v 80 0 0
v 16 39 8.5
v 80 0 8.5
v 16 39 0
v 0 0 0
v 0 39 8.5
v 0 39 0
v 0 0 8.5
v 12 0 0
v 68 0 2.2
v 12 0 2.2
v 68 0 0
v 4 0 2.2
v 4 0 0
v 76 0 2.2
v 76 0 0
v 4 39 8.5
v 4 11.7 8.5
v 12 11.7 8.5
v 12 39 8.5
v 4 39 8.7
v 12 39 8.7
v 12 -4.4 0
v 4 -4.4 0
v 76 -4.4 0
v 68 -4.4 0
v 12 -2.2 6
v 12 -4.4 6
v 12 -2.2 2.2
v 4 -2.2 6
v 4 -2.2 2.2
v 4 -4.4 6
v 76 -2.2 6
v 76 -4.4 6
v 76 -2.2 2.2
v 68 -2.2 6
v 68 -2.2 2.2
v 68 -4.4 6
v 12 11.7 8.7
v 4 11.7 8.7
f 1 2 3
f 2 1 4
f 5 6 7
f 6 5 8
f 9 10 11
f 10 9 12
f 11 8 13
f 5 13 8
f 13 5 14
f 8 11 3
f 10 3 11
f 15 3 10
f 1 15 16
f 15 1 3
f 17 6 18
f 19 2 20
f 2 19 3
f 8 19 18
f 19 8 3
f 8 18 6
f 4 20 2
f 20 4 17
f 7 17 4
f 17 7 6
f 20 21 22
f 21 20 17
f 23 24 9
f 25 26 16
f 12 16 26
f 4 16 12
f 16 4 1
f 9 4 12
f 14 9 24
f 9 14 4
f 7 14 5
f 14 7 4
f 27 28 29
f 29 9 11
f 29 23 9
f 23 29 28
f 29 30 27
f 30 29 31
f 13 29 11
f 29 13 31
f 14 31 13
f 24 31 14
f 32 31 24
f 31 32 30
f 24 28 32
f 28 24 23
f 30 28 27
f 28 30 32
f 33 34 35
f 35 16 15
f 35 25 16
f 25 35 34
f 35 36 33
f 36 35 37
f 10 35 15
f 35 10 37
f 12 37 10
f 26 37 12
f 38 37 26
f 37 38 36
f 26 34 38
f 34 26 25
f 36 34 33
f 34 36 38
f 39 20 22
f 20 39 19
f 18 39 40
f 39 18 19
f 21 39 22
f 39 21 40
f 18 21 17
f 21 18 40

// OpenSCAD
// kerb

kerb_length = 80; // mm
kerb_width = 39; // mm
kerb_height = 8.5; // mm
kerb_angle = 0.2; // %

linear_extrude(kerb_height) polygon([
    [0, 0], 
    [kerb_length, 0], 
    [kerb_length * kerb_angle, kerb_width], 
    [0, kerb_width]
]);

// hooks

hook_width = 8; // mm
hook_bend_height = 2.2; // mm
hook_bend_length = 2.2; // mm
hook_barb_height = 6; // mm
hook_barb_length = 1; // mm

linear_extrude(hook_bend_height) polygon([
    [0.05*kerb_length, 0], 
    [0.05*kerb_length + hook_width, 0], 
    [0.05*kerb_length + hook_width, -hook_bend_length], 
    [0.05*kerb_length, -hook_bend_length]
]);


linear_extrude(hook_barb_height) polygon([
    [0.05*kerb_length, -hook_bend_length], 
    [0.05*kerb_length + hook_width, -hook_bend_length], 
    [0.05*kerb_length + hook_width, -hook_bend_length-hook_bend_length], 
    [0.05*kerb_length, -hook_bend_length-hook_bend_length]
]);

linear_extrude(hook_bend_height) polygon([
    [0.95*kerb_length - hook_width, 0], 
    [0.95*kerb_length, 0], 
    [0.95*kerb_length, -hook_bend_length], 
    [0.95*kerb_length - hook_width, -hook_bend_length]
]);


linear_extrude(hook_barb_height) polygon([
    [0.95*kerb_length - hook_width, -hook_bend_length], 
    [0.95*kerb_length, -hook_bend_length], 
    [0.95*kerb_length, -hook_bend_length-hook_bend_length], 
    [0.95*kerb_length - hook_width, -hook_bend_length-hook_bend_length]
]);

// strips

strip_count = 1; // #
strip_width = 0.5; // %
strip_length = 0.7; // %
strip_height = 0.2; // mm

for(i = [0 : strip_count - 1]) {
    strip_size = strip_width * kerb_length * kerb_angle / strip_count;
    strip_offset = i * kerb_length * kerb_angle / strip_count + (1-strip_width) * kerb_length * kerb_angle / (2 * strip_count);

    linear_extrude(kerb_height + strip_height) polygon([
        [strip_offset, kerb_width],
        [strip_offset + strip_size, kerb_width],
        [strip_offset + strip_size, (1-strip_length) * kerb_width],
        [strip_offset, (1-strip_length) * kerb_width]
    ]);
}
